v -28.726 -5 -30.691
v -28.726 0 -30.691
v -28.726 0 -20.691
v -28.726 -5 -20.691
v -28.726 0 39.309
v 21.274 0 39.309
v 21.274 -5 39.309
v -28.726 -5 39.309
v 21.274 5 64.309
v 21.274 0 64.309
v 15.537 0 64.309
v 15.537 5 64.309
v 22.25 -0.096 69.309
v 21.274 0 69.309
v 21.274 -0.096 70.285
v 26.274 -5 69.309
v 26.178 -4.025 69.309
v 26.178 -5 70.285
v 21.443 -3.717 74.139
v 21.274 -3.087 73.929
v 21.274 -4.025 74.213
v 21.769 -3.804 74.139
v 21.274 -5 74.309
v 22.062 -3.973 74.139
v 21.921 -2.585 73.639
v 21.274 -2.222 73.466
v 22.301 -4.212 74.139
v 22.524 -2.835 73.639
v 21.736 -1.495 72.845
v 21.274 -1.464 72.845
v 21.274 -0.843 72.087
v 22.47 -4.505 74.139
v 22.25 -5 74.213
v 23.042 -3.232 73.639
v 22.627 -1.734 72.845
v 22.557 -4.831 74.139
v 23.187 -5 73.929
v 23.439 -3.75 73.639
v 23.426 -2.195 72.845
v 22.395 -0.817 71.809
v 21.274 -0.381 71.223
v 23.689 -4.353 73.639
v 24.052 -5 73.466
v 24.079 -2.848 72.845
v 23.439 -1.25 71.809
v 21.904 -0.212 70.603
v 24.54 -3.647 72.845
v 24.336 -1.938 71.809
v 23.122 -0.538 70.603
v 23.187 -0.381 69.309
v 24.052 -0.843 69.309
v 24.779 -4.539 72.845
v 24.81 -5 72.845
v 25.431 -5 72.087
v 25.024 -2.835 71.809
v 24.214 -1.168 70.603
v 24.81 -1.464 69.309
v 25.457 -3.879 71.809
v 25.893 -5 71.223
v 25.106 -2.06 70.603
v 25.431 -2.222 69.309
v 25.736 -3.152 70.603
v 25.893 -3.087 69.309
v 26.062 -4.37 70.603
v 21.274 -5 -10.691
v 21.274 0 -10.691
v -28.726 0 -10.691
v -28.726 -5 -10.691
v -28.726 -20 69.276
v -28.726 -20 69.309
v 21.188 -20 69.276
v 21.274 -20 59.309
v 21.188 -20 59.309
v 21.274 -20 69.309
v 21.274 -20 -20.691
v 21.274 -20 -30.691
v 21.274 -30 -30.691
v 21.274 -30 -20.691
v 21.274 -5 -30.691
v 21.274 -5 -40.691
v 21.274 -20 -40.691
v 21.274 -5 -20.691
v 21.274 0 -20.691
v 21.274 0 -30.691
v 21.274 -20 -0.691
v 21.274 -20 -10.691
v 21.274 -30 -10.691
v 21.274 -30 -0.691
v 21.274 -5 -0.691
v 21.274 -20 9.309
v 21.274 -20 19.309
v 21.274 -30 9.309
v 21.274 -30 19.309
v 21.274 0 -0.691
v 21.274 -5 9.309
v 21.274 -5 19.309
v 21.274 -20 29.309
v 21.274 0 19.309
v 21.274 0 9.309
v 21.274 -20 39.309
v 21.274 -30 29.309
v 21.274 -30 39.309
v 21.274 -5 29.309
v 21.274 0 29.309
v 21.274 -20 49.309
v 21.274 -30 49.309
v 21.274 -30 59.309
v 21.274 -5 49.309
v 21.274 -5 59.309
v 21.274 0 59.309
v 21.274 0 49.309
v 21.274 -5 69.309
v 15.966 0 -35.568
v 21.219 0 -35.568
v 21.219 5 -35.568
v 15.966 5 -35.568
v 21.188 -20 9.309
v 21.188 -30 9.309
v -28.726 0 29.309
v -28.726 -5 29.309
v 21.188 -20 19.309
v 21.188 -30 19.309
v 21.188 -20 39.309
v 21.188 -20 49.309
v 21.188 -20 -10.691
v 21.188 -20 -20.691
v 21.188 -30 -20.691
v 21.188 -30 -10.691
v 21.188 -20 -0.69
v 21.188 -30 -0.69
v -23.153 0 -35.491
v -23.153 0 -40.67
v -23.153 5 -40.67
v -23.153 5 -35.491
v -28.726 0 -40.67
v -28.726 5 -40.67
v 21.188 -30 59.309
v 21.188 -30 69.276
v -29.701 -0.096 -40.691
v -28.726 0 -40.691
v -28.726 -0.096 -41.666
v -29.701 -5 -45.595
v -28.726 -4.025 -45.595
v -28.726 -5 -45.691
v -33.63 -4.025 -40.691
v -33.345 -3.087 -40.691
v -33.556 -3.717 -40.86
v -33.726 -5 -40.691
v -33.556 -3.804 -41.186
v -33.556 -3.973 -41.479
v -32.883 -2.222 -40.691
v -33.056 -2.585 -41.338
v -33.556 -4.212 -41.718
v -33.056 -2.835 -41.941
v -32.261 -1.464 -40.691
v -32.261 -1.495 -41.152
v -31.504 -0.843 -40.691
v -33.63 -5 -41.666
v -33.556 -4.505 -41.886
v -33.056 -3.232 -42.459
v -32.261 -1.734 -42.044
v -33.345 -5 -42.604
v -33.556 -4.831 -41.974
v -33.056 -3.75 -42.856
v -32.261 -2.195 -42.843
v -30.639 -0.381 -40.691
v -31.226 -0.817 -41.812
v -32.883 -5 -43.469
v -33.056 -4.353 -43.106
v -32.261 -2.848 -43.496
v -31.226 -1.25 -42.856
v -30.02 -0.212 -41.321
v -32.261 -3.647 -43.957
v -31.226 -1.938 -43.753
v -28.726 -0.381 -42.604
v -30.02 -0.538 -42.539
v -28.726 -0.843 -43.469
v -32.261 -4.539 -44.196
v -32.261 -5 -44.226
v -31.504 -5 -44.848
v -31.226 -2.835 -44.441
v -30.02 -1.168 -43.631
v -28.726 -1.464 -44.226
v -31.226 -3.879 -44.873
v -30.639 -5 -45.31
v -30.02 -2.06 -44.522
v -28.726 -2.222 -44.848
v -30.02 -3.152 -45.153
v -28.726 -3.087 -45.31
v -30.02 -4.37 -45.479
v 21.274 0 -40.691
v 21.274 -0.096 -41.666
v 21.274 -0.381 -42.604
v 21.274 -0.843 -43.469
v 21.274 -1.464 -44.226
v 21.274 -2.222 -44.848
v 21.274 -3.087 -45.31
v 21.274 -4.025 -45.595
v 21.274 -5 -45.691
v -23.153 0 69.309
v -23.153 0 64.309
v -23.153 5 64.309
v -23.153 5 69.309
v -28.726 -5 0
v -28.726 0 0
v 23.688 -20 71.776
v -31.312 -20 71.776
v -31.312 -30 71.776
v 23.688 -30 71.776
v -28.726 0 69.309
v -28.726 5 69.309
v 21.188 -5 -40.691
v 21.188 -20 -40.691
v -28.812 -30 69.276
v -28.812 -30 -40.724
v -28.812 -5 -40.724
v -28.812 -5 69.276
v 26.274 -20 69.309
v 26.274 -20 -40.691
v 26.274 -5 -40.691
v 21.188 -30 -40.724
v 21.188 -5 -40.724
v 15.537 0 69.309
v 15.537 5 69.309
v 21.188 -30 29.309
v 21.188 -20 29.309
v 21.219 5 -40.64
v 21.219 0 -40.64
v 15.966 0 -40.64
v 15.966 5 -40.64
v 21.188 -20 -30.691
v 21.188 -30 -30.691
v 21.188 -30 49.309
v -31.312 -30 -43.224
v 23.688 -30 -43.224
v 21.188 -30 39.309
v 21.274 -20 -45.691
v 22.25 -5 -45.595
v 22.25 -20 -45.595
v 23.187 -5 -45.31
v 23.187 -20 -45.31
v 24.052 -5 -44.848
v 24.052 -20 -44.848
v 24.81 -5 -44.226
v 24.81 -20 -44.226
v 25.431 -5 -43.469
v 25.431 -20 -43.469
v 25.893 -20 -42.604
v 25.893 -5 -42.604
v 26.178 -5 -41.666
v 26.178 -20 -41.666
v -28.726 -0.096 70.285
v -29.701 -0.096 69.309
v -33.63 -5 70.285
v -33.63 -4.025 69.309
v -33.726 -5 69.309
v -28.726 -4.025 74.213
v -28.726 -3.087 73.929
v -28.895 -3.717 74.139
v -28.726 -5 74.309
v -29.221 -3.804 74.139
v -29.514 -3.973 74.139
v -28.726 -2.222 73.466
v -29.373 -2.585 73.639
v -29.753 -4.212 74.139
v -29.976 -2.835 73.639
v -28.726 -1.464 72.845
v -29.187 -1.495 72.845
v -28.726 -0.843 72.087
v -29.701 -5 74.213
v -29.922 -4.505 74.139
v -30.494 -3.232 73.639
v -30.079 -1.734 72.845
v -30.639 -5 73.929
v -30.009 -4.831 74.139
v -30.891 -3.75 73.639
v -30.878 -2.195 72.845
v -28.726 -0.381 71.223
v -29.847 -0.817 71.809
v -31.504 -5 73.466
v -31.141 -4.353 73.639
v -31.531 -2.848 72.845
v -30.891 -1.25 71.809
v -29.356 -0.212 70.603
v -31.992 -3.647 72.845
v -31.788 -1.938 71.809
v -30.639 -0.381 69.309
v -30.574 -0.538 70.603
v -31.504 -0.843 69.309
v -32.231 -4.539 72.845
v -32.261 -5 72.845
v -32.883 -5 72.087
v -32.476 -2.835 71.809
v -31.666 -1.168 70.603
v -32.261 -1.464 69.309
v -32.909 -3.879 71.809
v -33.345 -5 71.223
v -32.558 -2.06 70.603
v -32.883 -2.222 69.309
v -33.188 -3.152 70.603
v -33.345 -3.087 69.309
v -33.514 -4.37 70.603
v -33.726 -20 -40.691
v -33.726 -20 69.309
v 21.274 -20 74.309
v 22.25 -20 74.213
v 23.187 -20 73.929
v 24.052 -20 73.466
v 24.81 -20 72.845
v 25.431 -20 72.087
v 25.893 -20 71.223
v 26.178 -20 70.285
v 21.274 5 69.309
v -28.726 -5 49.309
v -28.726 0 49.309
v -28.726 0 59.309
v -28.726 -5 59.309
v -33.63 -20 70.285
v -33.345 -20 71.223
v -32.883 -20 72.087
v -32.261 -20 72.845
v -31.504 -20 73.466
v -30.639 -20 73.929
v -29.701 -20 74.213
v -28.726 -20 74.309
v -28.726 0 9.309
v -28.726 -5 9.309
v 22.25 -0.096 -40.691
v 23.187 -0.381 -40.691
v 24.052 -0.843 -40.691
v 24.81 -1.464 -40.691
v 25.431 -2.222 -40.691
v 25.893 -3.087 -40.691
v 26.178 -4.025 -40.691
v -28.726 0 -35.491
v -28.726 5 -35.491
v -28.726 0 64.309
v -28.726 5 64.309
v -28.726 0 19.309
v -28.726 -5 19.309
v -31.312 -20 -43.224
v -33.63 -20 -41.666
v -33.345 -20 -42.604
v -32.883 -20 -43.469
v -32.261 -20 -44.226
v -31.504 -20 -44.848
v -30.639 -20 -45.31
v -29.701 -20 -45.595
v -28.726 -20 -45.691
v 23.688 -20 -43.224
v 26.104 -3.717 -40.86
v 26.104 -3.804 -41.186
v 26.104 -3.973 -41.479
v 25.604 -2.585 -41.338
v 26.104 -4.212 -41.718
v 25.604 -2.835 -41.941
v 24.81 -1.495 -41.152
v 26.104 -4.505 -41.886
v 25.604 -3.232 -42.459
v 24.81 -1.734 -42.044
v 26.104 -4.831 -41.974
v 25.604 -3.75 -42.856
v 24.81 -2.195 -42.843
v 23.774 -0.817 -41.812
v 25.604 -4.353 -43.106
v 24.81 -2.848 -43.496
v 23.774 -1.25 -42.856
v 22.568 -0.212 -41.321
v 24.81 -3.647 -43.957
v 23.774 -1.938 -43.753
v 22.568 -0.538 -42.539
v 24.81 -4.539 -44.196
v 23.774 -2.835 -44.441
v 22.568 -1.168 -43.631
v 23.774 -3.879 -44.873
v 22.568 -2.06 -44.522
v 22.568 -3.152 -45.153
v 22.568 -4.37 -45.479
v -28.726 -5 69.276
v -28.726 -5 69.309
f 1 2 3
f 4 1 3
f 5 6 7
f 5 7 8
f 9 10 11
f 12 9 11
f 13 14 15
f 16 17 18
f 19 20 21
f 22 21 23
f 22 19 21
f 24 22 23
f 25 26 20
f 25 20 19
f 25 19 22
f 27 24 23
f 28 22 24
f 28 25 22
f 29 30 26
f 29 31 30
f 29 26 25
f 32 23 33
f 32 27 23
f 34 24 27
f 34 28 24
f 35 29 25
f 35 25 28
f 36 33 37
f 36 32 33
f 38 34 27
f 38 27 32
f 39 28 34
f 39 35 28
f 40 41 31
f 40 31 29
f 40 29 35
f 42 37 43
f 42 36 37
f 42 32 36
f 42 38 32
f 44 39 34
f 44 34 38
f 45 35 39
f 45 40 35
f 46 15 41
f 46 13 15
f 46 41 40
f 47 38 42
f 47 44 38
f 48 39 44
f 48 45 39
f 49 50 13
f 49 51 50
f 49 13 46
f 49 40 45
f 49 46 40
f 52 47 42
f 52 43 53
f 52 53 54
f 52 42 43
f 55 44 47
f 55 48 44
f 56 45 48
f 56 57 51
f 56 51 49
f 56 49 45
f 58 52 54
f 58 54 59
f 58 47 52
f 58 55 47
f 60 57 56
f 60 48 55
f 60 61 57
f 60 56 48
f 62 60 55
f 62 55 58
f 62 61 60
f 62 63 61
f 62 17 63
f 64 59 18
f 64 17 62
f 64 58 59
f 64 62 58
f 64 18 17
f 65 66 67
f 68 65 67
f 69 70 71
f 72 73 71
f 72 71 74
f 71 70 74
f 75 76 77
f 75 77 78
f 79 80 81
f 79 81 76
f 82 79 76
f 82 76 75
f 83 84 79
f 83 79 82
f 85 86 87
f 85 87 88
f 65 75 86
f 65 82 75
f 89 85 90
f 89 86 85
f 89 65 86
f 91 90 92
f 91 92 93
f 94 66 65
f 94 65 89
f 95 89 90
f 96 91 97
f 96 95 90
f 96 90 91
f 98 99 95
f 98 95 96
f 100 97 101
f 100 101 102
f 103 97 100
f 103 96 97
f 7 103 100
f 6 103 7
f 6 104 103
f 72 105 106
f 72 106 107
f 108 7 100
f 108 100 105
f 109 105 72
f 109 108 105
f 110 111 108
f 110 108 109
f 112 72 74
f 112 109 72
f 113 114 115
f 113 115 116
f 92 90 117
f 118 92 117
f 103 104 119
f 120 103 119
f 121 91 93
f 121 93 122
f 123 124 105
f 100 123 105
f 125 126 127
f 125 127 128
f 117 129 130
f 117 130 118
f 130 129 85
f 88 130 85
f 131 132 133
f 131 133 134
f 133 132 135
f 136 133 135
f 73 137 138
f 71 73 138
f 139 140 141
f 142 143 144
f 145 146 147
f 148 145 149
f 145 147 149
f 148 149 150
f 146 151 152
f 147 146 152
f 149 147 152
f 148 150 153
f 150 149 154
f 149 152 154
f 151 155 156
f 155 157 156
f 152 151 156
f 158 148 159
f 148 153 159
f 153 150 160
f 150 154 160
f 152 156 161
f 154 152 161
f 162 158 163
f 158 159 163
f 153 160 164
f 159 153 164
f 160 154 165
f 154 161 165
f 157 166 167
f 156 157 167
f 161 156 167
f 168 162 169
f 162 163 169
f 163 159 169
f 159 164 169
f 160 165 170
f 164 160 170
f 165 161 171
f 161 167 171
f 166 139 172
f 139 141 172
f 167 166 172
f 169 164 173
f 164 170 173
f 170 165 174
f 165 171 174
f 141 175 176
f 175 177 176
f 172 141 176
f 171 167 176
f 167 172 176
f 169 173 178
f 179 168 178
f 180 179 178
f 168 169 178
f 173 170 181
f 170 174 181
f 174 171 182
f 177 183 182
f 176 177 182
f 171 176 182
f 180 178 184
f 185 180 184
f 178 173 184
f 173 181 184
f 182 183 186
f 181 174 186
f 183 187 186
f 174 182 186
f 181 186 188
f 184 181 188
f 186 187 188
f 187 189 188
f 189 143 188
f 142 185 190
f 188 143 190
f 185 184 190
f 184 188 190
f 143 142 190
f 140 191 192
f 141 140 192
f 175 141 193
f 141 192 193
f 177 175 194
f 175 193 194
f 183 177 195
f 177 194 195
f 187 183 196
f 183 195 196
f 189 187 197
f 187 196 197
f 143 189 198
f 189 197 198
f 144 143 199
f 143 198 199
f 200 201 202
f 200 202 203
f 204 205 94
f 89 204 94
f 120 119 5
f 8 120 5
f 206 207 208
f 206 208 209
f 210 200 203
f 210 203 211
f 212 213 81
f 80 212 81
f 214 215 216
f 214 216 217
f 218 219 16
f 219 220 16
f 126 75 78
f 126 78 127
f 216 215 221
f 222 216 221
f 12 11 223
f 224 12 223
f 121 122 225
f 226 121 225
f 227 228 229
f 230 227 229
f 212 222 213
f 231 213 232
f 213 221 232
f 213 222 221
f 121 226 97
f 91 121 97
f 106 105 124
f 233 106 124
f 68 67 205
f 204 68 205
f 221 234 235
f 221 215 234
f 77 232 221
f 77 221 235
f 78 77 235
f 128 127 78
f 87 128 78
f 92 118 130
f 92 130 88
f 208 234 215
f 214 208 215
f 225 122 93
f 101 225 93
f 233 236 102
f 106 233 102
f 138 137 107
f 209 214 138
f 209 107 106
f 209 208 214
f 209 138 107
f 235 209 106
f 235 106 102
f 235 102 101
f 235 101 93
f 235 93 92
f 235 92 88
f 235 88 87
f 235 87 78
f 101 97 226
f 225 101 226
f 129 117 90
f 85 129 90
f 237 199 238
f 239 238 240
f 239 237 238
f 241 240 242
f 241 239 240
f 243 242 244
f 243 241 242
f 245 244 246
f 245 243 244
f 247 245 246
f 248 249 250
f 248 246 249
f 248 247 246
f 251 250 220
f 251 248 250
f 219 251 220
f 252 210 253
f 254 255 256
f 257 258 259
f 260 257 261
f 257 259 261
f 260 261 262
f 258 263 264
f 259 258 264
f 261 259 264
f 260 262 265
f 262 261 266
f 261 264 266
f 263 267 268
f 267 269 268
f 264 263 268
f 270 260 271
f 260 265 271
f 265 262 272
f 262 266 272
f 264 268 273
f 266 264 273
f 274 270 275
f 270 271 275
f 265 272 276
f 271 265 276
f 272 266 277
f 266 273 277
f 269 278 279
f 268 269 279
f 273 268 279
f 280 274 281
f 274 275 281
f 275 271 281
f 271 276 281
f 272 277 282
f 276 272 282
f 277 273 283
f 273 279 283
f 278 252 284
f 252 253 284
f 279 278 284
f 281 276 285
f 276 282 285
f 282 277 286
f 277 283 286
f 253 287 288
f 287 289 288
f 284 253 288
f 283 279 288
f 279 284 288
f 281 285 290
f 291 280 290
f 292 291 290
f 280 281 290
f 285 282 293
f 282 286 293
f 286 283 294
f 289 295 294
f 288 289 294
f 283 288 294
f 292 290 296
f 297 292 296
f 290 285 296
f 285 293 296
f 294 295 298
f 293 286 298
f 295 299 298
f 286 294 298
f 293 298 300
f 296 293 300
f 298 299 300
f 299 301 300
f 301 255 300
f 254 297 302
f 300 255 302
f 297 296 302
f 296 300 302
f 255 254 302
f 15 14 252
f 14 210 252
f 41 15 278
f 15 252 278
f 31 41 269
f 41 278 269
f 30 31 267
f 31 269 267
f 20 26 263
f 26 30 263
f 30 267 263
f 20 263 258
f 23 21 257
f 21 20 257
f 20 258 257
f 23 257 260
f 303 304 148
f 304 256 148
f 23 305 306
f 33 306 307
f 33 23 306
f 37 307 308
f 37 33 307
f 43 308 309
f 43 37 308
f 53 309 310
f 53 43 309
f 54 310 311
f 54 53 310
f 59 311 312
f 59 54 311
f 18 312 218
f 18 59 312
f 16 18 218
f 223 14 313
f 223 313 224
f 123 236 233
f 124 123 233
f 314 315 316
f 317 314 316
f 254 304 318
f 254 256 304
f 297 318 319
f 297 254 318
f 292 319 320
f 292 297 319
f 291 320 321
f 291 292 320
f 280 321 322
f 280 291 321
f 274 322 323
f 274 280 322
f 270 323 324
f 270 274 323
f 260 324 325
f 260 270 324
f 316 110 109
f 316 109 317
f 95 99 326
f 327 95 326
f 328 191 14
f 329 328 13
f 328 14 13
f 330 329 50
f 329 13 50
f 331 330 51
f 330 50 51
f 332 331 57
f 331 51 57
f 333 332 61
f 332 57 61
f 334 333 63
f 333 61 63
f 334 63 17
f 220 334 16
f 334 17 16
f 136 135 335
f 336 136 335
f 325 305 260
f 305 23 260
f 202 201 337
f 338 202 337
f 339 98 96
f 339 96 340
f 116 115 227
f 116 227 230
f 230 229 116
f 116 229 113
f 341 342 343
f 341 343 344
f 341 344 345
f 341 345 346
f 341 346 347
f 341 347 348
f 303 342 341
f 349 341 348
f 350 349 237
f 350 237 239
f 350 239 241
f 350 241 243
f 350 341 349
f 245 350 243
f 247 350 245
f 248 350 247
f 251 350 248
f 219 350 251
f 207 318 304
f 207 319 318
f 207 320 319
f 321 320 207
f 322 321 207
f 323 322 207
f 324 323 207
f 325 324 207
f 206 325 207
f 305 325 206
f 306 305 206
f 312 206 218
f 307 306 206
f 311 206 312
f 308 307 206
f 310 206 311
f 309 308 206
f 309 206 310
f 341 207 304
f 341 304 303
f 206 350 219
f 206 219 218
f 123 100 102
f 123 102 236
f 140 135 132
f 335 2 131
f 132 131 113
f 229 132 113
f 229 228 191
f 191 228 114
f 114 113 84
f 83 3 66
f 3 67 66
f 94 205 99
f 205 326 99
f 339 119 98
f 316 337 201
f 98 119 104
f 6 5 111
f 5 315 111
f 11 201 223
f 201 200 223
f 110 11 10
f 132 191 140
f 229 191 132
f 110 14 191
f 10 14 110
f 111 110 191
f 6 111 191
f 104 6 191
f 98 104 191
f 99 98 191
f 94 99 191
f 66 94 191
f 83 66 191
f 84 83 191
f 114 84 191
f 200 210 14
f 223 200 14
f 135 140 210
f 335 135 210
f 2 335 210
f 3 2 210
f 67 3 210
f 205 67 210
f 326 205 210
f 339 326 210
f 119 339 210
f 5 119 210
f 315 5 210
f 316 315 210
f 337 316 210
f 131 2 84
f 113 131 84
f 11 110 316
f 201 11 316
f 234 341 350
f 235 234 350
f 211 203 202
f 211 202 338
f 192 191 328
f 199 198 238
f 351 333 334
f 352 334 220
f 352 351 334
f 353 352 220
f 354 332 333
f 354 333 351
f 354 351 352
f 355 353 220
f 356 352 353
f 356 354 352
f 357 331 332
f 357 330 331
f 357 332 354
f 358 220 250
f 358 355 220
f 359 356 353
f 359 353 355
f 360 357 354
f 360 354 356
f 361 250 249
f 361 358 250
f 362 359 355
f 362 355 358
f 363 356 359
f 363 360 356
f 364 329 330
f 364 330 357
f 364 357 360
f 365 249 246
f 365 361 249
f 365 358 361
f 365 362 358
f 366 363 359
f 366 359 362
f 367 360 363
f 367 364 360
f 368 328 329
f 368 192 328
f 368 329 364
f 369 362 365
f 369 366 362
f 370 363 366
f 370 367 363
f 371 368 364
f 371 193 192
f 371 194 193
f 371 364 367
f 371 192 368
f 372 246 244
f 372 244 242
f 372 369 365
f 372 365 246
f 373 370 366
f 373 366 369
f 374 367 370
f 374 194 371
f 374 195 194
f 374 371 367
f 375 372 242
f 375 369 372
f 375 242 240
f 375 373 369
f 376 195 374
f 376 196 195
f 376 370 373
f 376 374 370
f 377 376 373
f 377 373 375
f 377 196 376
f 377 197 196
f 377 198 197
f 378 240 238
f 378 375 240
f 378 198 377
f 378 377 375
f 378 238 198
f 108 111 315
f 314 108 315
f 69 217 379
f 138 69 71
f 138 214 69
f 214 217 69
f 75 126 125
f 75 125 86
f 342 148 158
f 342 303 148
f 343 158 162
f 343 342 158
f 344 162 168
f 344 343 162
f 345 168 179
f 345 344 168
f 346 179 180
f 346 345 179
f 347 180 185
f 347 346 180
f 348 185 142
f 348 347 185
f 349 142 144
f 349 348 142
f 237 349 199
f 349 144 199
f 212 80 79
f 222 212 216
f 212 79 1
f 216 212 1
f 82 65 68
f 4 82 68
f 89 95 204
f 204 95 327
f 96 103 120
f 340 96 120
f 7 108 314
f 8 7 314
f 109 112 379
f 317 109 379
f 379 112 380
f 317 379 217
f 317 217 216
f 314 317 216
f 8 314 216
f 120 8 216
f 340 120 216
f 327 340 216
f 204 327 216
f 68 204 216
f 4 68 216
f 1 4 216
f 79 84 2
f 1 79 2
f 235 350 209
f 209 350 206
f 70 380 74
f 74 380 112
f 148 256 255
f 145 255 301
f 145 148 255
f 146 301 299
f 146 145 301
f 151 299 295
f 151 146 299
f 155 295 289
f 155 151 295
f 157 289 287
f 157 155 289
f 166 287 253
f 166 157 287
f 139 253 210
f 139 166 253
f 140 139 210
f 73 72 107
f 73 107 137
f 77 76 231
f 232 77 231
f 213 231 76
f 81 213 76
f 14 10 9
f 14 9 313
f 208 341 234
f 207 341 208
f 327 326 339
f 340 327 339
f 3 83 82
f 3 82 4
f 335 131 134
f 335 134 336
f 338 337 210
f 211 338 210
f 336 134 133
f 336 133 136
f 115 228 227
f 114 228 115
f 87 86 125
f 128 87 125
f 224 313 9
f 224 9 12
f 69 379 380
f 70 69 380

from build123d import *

# Parameters (mm, degrees)
F0_W      = 55
F0_H      = 115
F0_W_2    = 50
F0_H_2    = 110
F1_DEPTH  = 20
F3_W      = 55
F3_H      = 115
F5_DEPTH  = 10
F6_W      = 50
F6_H      = 110
F7_DEPTH  = 215.8
F8_W      = 60
F8_H      = 120
F9_DEPTH  = 5
F10_W     = 50
F10_H     = 10
F12_DEPTH = 30.001
F13_R     = 4.99999
F14_W     = 5.7372912765
F14_H     = 5
F14_W_2   = 5.2530970424
F14_H_2   = 5.0719603896
F15_DEPTH = 5
F16_W     = 5.5731512606
F16_H     = 5
F16_H_2   = 5.1789134741
F17_DEPTH = 5


# Not quite as in the source:
# - a fillet or chamfer is up to 0.001 mm smaller than in the source, because OpenCascade refuses the exact size


with BuildPart() as f1:
    # F0 (on Front) → F1 (new body)
    with BuildSketch(Plane.XZ):
        Polygon((-31.2259571254, 74.3091152272), (-33.7259571254, 74.3091152272), (-33.7259571254, -45.6908847728), (26.2740428746, -45.6908847728), (26.2740428746, 74.3091152272), align=None)
        with Locations((-3.7259571254, 14.3091152272)):
            Rectangle(F0_W, F0_H, mode=Mode.SUBTRACT)
        with Locations((-3.7259571254, 14.3091152272)):
            Rectangle(F0_W, F0_H)
        with Locations((-3.7259571254, 14.3091152272)):
            Rectangle(F0_W_2, F0_H_2, mode=Mode.SUBTRACT)
    extrude(amount=F1_DEPTH)

    # F3 (on offset) + F4 (on offset) → F5 (join)
    with BuildSketch(Plane.XZ.offset(20)):
        with Locations((-3.8123092055, 14.2757248878)):
            Rectangle(F3_W, F3_H)
    with BuildSketch(Plane.XZ.offset(20)):
        Polygon((-28.6821052432, -40.8934615552), (21.3168207556, -40.8934615552), (20.2441066504, 69.0581277013), (-28.6821052432, 69.0581277013), align=None)
    extrude(amount=F5_DEPTH)

    # F6 (on face) → F7 (cut)
    with BuildSketch(Plane.XZ.offset(30)):
        with Locations((-3.8123092055, 14.2757248878)):
            Rectangle(F6_W, F6_H)
    extrude(amount=-F7_DEPTH, mode=Mode.SUBTRACT)

    # F8 (on face) → F9 (join)
    with BuildSketch(Plane(origin=(0, 0, 0), x_dir=(-1, 0, 0), z_dir=(0, 1, 0))):
        with Locations((3.7259571254, 14.3091152272)):
            Rectangle(F8_W, F8_H)
    extrude(amount=-F9_DEPTH)

    # F10 (on face) → F12 (cut, through all)
    with BuildSketch(Plane(origin=(0, 0, 0), x_dir=(-1, 0, 0), z_dir=(0, 1, 0))):
        with Locations((3.7259571254, 54.3091152272)):
            Rectangle(F10_W, F10_H)
        with Locations((3.7259571254, 34.3091152272)):
            Rectangle(F10_W, F10_H)
        with Locations((3.7259571254, 14.3091152272)):
            Rectangle(F10_W, F10_H)
        Polygon((-21.2740428746, -0.6908847728), (-21.2740428746, -10.6908847728), (28.7259571254, -10.6908847728), (28.7259571254, 0), align=None)
        with Locations((3.7259571254, -25.6908847728)):
            Rectangle(F10_W, F10_H)
    extrude(amount=-F12_DEPTH, mode=Mode.SUBTRACT)

    # F13 (radius 5 in the source; OpenCascade refuses exactly that, so slightly less here)
    f13_edges = [f1.edges().sort_by_distance(p)[0] for p in [
        (-3.725957, 0, -45.690885),
        (-33.725957, 0, 14.309115),
        (26.274043, 0, 14.309115),
        (-3.725957, 0, 74.309115),
        (26.274043, -10, -45.690885),
        (26.274043, -10, 74.309115),
        (-33.725957, -10, -45.690885),
        (-33.725957, -10, 74.309115),
    ]]
    fillet(f13_edges, radius=F13_R)

    # F14 (on face) → F15 (join)
    with BuildSketch(Plane(origin=(0, 0, 0), x_dir=(-1, 0, 0), z_dir=(0, 1, 0))):
        with Locations((-18.4053972363, 66.8091152272)):
            Rectangle(F14_W, F14_H)
        with Locations((-18.5921611264, -38.1038859487)):
            Rectangle(F14_W_2, F14_H_2)
    extrude(amount=F15_DEPTH)

    # F16 (on face) → F17 (join)
    with BuildSketch(Plane(origin=(0, 0, 0), x_dir=(-1, 0, 0), z_dir=(0, 1, 0))):
        with Locations((25.9393814951, 66.8091152272)):
            Rectangle(F16_W, F16_H)
        with Locations((25.9393814951, -38.0802713335)):
            Rectangle(F16_W, F16_H_2)
    extrude(amount=F17_DEPTH)


solid = f1.part
